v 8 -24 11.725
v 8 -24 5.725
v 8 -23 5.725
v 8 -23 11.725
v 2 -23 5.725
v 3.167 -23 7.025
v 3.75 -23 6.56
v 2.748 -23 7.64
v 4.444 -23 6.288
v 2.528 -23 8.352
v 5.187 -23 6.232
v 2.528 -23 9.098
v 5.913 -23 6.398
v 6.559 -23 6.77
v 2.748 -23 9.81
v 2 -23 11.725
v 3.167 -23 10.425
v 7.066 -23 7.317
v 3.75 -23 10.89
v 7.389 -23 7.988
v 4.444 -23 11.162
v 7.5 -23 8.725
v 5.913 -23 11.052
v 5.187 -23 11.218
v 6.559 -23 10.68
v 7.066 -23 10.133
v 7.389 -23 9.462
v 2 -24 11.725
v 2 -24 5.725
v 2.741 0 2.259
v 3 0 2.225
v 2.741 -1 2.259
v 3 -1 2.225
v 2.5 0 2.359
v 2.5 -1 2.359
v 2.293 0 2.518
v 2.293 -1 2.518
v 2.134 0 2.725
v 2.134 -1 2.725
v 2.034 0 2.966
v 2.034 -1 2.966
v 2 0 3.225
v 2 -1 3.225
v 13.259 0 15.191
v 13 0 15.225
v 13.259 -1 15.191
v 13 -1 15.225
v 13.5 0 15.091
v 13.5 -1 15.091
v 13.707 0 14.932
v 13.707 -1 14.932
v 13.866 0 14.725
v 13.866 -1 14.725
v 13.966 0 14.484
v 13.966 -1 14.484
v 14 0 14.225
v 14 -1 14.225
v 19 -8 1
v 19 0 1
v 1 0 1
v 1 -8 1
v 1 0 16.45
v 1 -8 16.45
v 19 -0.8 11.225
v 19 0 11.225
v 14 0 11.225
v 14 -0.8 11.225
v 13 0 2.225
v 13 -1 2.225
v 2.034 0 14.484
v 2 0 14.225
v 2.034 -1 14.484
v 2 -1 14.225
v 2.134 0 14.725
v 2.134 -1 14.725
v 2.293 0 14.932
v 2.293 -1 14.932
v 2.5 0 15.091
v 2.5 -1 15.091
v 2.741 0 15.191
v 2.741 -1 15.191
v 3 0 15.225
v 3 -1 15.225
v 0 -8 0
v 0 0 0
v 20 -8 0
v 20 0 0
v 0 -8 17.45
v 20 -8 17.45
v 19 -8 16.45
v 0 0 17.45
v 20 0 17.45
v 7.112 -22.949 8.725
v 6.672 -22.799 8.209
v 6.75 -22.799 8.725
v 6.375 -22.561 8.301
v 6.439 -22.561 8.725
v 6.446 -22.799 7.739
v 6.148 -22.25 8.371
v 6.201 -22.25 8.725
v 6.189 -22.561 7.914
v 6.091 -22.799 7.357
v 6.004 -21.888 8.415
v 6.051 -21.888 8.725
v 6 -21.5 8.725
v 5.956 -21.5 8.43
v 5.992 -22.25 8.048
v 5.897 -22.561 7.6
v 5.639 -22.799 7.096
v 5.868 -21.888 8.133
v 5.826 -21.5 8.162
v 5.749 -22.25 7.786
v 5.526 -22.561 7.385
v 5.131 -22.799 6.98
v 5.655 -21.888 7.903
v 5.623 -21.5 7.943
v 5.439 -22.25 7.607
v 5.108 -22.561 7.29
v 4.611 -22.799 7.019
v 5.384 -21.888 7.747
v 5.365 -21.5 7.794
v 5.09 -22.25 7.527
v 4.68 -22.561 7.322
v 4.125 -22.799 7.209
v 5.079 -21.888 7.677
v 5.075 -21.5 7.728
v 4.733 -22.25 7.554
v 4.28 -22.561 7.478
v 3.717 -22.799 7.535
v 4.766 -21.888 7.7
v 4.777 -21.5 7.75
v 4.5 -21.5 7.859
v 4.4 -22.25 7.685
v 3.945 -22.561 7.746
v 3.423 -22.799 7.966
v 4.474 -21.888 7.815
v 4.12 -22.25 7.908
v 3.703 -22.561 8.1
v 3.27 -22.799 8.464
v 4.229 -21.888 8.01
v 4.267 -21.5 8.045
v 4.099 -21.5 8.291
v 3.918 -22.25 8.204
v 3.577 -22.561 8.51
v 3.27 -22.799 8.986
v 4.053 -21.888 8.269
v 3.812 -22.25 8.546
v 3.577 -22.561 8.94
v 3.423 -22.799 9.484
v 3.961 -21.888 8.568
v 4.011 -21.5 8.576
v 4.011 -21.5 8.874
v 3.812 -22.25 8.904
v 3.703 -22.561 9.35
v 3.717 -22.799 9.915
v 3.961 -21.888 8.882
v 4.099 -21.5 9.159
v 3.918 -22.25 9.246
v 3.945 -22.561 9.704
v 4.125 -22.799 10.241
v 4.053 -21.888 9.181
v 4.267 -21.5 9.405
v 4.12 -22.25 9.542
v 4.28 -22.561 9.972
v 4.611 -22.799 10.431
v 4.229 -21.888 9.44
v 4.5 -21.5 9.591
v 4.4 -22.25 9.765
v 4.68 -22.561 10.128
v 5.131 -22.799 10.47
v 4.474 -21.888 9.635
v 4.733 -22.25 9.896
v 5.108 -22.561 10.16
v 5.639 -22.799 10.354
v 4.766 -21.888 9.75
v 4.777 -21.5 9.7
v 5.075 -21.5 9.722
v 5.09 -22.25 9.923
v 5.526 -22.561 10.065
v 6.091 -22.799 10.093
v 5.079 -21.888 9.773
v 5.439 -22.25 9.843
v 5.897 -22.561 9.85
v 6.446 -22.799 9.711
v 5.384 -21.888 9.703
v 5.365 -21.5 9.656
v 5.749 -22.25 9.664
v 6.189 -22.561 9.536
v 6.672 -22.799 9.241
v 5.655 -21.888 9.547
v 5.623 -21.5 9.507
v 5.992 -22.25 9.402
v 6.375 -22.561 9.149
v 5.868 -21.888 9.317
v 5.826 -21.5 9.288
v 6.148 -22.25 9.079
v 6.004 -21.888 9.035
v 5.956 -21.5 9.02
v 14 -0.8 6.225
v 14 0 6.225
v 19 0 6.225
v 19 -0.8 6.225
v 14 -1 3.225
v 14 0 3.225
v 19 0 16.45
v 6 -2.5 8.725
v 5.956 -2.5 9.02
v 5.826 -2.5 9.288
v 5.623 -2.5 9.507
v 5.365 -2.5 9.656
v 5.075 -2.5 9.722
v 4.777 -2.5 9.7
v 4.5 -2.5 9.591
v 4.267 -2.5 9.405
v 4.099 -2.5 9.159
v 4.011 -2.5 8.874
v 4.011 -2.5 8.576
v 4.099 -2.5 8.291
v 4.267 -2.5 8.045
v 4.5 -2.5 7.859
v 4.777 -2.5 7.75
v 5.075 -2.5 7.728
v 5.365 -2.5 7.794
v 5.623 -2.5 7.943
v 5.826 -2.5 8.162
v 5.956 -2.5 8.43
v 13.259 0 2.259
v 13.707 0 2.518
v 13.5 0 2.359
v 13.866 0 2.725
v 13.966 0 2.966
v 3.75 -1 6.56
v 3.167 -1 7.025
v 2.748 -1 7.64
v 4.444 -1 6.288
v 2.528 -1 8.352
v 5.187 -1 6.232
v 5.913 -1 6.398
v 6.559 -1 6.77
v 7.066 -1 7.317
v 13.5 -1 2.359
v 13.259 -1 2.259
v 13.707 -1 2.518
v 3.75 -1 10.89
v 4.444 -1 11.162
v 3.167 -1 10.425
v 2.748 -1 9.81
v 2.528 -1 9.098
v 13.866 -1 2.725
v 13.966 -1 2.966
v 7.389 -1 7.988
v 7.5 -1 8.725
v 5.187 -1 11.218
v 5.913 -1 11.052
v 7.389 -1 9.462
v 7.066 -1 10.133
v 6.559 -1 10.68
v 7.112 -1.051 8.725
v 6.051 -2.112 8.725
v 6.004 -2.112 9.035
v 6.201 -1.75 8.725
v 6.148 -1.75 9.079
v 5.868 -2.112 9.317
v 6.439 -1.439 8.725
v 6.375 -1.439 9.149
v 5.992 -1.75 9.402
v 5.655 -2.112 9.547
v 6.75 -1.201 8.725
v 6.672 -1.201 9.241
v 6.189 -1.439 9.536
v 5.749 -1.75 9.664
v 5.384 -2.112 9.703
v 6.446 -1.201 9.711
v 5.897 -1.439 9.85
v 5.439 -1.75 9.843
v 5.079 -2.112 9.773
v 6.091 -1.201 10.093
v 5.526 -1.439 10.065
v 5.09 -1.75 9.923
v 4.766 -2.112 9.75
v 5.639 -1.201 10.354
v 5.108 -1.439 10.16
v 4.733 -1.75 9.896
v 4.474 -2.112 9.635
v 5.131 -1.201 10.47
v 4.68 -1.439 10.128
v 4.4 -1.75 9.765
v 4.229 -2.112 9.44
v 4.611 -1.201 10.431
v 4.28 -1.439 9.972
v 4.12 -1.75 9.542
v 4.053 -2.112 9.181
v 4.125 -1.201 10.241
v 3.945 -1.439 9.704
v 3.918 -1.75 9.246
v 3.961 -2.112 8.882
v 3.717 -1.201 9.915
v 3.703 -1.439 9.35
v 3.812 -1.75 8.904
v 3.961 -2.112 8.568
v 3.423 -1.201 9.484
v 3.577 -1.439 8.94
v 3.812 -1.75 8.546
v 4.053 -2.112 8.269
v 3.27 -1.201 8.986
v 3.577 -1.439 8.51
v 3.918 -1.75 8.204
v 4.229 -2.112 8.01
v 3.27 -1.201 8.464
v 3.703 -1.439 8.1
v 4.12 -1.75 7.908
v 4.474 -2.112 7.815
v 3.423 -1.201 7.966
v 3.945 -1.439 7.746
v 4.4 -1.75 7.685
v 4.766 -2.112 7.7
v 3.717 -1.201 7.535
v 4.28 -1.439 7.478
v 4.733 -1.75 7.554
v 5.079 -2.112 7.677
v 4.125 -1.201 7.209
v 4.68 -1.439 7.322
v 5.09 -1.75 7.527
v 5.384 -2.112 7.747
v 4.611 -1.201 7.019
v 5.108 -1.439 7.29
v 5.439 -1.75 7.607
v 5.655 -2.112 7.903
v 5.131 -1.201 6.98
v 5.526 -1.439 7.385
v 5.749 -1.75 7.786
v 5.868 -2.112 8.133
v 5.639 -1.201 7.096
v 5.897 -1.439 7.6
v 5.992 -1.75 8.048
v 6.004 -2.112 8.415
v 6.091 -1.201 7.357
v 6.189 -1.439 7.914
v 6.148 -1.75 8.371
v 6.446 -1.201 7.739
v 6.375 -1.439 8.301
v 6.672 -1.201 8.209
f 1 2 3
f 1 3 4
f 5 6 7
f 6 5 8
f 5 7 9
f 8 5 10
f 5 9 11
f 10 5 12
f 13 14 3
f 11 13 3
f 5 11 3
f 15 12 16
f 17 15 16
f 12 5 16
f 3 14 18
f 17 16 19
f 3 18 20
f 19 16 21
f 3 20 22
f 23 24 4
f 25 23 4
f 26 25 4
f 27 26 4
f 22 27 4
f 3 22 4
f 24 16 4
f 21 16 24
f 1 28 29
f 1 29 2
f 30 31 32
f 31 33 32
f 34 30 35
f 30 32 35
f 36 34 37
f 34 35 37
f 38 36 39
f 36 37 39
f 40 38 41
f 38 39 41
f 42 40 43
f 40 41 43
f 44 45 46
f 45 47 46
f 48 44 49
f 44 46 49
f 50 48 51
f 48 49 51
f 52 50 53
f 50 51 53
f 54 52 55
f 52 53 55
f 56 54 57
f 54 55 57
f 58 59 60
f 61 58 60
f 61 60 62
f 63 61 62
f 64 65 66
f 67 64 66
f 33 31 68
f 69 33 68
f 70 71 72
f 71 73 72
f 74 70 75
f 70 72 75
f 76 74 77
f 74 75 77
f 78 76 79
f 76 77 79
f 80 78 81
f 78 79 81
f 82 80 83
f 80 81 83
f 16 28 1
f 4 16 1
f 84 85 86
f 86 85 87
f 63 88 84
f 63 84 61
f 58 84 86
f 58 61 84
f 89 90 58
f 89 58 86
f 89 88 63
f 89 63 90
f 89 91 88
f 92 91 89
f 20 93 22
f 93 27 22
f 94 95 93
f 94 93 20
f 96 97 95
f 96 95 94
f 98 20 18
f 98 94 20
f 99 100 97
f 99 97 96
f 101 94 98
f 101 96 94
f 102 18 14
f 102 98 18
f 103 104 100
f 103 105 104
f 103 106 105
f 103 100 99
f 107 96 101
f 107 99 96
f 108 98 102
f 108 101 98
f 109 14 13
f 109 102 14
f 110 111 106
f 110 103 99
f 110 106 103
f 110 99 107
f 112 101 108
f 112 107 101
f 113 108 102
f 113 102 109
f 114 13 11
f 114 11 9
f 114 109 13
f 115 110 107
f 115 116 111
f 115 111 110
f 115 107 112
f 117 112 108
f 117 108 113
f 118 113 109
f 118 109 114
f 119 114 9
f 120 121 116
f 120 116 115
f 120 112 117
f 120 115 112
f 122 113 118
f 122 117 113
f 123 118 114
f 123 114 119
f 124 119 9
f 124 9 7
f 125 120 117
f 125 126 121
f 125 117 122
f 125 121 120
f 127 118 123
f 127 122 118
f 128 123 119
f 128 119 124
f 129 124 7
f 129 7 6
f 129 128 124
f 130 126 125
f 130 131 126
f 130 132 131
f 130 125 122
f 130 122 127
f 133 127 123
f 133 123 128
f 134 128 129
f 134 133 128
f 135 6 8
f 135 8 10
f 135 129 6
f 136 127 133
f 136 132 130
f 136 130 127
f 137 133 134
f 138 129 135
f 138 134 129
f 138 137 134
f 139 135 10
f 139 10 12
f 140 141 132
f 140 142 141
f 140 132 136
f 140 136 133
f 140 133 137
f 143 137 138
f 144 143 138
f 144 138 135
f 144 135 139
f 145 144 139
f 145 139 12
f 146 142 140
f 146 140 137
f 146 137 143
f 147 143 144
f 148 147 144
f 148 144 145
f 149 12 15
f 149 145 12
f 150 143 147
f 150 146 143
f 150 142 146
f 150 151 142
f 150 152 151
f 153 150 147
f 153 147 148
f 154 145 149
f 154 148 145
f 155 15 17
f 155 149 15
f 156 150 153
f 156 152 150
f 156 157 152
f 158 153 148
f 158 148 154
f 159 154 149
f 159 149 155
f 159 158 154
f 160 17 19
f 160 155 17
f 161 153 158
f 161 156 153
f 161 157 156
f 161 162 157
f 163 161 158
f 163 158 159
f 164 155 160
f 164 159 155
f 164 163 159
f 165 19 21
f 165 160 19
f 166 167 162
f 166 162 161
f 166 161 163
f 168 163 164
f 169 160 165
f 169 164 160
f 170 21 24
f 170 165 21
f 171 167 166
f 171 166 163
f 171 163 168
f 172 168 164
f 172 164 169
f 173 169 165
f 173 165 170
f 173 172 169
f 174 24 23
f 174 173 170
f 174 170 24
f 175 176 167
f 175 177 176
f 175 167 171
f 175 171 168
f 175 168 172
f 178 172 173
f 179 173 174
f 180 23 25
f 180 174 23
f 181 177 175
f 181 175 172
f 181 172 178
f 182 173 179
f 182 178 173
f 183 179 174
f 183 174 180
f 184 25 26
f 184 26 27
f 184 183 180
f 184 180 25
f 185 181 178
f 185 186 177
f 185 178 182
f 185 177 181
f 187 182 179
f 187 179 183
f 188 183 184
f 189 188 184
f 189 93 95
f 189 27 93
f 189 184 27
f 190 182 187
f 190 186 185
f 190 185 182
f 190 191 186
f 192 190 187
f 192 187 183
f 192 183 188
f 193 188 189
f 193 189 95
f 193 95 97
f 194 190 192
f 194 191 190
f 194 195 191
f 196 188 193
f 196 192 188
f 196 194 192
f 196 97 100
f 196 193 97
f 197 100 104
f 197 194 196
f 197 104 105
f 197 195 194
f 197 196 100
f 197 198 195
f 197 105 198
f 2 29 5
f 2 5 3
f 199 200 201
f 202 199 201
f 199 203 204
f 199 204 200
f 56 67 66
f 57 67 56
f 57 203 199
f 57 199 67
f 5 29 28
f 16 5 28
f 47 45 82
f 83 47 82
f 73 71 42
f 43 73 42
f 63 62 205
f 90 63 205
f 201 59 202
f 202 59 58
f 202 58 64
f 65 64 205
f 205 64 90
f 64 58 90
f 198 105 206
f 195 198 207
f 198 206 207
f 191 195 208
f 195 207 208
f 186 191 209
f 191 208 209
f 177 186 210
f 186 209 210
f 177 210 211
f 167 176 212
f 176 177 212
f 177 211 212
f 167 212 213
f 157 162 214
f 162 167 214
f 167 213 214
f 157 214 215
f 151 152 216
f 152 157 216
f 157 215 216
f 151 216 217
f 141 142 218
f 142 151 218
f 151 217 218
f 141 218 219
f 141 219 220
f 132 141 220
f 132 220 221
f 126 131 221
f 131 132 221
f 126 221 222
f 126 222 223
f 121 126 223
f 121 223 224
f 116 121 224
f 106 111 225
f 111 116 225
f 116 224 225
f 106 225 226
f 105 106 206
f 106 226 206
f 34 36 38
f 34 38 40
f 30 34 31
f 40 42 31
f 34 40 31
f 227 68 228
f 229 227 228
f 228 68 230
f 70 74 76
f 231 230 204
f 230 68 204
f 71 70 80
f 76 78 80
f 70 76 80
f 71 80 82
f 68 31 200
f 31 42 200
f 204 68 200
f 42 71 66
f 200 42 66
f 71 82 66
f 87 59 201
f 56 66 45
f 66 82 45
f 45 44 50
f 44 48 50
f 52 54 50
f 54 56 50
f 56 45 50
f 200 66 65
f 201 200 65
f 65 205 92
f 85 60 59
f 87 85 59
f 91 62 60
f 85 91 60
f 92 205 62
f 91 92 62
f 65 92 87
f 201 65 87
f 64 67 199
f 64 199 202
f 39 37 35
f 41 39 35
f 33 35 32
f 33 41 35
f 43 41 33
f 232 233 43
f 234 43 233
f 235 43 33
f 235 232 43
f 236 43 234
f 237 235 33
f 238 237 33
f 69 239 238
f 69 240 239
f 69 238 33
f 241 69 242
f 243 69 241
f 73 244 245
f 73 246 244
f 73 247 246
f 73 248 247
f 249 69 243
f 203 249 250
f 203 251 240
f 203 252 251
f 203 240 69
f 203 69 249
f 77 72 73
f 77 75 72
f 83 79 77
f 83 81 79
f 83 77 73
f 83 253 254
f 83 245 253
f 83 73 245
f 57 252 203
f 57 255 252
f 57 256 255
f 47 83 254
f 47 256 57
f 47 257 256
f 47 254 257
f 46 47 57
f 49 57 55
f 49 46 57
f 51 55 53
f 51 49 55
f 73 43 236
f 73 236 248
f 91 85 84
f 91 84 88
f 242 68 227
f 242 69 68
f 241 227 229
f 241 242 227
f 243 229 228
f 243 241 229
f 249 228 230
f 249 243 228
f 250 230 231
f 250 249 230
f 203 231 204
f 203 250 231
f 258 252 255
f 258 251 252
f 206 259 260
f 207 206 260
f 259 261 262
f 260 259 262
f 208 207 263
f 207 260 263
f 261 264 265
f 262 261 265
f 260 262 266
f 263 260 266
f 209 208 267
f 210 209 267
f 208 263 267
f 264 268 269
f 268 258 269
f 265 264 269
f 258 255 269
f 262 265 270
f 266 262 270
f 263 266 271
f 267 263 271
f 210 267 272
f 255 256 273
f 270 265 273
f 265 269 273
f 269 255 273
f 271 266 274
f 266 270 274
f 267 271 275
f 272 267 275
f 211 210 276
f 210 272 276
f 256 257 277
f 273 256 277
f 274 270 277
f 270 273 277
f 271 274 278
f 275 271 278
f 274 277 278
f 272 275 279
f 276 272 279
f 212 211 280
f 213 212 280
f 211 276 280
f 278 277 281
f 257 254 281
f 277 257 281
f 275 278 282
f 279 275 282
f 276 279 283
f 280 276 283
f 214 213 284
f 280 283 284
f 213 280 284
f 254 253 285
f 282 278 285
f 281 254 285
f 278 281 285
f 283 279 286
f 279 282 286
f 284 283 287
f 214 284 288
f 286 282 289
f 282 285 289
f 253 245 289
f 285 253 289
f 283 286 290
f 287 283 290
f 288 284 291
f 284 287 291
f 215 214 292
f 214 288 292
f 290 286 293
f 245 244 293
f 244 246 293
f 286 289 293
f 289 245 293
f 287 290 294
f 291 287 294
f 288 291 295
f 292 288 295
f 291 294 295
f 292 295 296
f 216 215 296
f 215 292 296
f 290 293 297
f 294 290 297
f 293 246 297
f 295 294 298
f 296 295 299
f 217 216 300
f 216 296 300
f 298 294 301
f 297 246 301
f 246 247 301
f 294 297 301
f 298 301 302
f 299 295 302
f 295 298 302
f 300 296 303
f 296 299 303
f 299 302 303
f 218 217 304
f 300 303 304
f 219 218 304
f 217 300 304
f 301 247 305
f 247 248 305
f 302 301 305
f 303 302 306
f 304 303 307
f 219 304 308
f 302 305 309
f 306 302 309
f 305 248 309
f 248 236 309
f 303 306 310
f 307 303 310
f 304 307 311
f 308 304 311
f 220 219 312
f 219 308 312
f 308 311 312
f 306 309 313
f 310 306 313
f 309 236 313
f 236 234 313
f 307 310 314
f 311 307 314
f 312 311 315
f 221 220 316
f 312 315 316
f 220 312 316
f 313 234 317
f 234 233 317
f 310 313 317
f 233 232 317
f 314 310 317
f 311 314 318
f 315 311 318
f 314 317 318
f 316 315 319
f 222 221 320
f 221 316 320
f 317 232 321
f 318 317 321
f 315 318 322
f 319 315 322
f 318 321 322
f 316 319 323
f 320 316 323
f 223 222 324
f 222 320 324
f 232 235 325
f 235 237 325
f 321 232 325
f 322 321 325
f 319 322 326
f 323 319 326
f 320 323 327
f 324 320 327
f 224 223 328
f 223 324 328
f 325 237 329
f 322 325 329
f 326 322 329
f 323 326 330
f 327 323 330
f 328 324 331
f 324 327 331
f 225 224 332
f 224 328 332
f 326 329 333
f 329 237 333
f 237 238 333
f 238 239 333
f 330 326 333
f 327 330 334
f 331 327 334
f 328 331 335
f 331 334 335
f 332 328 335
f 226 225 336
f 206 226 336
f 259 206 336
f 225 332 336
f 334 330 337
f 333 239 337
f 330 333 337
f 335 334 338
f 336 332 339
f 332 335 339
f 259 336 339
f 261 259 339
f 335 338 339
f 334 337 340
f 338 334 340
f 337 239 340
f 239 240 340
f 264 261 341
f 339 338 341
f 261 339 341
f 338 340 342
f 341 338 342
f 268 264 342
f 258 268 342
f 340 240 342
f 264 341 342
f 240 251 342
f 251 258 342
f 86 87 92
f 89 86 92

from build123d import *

# Parameters (mm, degrees)
F0_W     = 20
F0_H     = 17.45
F1_DEPTH = 8
F0_W_2   = 6
F0_H_2   = 6
F0_R     = 1
F2_DEPTH = 1
F3_DEPTH = 24
F4_W     = 6
F4_H     = 6
F5_DEPTH = 1
F6_R     = 1.5
F7_W     = 5
F7_H     = 5
F8_DEPTH = 0.2
F9_R     = 1


with BuildPart() as f1:
    # F0 (on Front) → F1 (new body)
    with BuildSketch(Plane.XZ):
        with Locations((10, 8.725)):
            Rectangle(F0_W, F0_H)
        Polygon((19, 16.45), (19, 11.225), (19, 6.225), (19, 1), (1, 1), (1, 16.45), align=None, mode=Mode.SUBTRACT)
    extrude(amount=F1_DEPTH)

    # F0 (on Front) → F2 (join)
    with BuildSketch(Plane.XZ):
        Polygon((19, 11.225), (14, 11.225), (14, 15.225), (2, 15.225), (2, 11.725), (8, 11.725), (8, 5.725), (2, 5.725), (2, 2.225), (14, 2.225), (14, 6.225), (19, 6.225), align=None)
        with Locations((5, 8.725)):
            Rectangle(F0_W_2, F0_H_2)
        with Locations((5, 8.725)):
            Circle(F0_R, mode=Mode.SUBTRACT)
    extrude(amount=F2_DEPTH)

    # F0 (on Front) → F3 (join)
    with BuildSketch(Plane.XZ):
        with Locations((5, 8.725)):
            Circle(F0_R)
    extrude(amount=F3_DEPTH)

    # F4 (on face) → F5 (join)
    with BuildSketch(Plane.XZ.offset(24)):
        with Locations((5, 8.725)):
            Rectangle(F4_W, F4_H)
    extrude(amount=-F5_DEPTH)

    # F6
    f6_edges = [f1.edges().sort_by_distance(p)[0] for p in [
        (4, -23, 8.725),
        (4, -1, 8.725),
    ]]
    fillet(f6_edges, radius=F6_R)

    # F7 (on face) → F8 (cut)
    with BuildSketch(Plane.XZ.offset(1)):
        with Locations((16.5, 8.725)):
            Rectangle(F7_W, F7_H)
    extrude(amount=-F8_DEPTH, mode=Mode.SUBTRACT)

    # F9
    f9_edges = [f1.edges().sort_by_distance(p)[0] for p in [
        (2, -0.5, 15.225),
        (14, -0.5, 15.225),
        (2, -0.5, 2.225),
        (14, -0.5, 2.225),
    ]]
    fillet(f9_edges, radius=F9_R)


solid = f1.part
